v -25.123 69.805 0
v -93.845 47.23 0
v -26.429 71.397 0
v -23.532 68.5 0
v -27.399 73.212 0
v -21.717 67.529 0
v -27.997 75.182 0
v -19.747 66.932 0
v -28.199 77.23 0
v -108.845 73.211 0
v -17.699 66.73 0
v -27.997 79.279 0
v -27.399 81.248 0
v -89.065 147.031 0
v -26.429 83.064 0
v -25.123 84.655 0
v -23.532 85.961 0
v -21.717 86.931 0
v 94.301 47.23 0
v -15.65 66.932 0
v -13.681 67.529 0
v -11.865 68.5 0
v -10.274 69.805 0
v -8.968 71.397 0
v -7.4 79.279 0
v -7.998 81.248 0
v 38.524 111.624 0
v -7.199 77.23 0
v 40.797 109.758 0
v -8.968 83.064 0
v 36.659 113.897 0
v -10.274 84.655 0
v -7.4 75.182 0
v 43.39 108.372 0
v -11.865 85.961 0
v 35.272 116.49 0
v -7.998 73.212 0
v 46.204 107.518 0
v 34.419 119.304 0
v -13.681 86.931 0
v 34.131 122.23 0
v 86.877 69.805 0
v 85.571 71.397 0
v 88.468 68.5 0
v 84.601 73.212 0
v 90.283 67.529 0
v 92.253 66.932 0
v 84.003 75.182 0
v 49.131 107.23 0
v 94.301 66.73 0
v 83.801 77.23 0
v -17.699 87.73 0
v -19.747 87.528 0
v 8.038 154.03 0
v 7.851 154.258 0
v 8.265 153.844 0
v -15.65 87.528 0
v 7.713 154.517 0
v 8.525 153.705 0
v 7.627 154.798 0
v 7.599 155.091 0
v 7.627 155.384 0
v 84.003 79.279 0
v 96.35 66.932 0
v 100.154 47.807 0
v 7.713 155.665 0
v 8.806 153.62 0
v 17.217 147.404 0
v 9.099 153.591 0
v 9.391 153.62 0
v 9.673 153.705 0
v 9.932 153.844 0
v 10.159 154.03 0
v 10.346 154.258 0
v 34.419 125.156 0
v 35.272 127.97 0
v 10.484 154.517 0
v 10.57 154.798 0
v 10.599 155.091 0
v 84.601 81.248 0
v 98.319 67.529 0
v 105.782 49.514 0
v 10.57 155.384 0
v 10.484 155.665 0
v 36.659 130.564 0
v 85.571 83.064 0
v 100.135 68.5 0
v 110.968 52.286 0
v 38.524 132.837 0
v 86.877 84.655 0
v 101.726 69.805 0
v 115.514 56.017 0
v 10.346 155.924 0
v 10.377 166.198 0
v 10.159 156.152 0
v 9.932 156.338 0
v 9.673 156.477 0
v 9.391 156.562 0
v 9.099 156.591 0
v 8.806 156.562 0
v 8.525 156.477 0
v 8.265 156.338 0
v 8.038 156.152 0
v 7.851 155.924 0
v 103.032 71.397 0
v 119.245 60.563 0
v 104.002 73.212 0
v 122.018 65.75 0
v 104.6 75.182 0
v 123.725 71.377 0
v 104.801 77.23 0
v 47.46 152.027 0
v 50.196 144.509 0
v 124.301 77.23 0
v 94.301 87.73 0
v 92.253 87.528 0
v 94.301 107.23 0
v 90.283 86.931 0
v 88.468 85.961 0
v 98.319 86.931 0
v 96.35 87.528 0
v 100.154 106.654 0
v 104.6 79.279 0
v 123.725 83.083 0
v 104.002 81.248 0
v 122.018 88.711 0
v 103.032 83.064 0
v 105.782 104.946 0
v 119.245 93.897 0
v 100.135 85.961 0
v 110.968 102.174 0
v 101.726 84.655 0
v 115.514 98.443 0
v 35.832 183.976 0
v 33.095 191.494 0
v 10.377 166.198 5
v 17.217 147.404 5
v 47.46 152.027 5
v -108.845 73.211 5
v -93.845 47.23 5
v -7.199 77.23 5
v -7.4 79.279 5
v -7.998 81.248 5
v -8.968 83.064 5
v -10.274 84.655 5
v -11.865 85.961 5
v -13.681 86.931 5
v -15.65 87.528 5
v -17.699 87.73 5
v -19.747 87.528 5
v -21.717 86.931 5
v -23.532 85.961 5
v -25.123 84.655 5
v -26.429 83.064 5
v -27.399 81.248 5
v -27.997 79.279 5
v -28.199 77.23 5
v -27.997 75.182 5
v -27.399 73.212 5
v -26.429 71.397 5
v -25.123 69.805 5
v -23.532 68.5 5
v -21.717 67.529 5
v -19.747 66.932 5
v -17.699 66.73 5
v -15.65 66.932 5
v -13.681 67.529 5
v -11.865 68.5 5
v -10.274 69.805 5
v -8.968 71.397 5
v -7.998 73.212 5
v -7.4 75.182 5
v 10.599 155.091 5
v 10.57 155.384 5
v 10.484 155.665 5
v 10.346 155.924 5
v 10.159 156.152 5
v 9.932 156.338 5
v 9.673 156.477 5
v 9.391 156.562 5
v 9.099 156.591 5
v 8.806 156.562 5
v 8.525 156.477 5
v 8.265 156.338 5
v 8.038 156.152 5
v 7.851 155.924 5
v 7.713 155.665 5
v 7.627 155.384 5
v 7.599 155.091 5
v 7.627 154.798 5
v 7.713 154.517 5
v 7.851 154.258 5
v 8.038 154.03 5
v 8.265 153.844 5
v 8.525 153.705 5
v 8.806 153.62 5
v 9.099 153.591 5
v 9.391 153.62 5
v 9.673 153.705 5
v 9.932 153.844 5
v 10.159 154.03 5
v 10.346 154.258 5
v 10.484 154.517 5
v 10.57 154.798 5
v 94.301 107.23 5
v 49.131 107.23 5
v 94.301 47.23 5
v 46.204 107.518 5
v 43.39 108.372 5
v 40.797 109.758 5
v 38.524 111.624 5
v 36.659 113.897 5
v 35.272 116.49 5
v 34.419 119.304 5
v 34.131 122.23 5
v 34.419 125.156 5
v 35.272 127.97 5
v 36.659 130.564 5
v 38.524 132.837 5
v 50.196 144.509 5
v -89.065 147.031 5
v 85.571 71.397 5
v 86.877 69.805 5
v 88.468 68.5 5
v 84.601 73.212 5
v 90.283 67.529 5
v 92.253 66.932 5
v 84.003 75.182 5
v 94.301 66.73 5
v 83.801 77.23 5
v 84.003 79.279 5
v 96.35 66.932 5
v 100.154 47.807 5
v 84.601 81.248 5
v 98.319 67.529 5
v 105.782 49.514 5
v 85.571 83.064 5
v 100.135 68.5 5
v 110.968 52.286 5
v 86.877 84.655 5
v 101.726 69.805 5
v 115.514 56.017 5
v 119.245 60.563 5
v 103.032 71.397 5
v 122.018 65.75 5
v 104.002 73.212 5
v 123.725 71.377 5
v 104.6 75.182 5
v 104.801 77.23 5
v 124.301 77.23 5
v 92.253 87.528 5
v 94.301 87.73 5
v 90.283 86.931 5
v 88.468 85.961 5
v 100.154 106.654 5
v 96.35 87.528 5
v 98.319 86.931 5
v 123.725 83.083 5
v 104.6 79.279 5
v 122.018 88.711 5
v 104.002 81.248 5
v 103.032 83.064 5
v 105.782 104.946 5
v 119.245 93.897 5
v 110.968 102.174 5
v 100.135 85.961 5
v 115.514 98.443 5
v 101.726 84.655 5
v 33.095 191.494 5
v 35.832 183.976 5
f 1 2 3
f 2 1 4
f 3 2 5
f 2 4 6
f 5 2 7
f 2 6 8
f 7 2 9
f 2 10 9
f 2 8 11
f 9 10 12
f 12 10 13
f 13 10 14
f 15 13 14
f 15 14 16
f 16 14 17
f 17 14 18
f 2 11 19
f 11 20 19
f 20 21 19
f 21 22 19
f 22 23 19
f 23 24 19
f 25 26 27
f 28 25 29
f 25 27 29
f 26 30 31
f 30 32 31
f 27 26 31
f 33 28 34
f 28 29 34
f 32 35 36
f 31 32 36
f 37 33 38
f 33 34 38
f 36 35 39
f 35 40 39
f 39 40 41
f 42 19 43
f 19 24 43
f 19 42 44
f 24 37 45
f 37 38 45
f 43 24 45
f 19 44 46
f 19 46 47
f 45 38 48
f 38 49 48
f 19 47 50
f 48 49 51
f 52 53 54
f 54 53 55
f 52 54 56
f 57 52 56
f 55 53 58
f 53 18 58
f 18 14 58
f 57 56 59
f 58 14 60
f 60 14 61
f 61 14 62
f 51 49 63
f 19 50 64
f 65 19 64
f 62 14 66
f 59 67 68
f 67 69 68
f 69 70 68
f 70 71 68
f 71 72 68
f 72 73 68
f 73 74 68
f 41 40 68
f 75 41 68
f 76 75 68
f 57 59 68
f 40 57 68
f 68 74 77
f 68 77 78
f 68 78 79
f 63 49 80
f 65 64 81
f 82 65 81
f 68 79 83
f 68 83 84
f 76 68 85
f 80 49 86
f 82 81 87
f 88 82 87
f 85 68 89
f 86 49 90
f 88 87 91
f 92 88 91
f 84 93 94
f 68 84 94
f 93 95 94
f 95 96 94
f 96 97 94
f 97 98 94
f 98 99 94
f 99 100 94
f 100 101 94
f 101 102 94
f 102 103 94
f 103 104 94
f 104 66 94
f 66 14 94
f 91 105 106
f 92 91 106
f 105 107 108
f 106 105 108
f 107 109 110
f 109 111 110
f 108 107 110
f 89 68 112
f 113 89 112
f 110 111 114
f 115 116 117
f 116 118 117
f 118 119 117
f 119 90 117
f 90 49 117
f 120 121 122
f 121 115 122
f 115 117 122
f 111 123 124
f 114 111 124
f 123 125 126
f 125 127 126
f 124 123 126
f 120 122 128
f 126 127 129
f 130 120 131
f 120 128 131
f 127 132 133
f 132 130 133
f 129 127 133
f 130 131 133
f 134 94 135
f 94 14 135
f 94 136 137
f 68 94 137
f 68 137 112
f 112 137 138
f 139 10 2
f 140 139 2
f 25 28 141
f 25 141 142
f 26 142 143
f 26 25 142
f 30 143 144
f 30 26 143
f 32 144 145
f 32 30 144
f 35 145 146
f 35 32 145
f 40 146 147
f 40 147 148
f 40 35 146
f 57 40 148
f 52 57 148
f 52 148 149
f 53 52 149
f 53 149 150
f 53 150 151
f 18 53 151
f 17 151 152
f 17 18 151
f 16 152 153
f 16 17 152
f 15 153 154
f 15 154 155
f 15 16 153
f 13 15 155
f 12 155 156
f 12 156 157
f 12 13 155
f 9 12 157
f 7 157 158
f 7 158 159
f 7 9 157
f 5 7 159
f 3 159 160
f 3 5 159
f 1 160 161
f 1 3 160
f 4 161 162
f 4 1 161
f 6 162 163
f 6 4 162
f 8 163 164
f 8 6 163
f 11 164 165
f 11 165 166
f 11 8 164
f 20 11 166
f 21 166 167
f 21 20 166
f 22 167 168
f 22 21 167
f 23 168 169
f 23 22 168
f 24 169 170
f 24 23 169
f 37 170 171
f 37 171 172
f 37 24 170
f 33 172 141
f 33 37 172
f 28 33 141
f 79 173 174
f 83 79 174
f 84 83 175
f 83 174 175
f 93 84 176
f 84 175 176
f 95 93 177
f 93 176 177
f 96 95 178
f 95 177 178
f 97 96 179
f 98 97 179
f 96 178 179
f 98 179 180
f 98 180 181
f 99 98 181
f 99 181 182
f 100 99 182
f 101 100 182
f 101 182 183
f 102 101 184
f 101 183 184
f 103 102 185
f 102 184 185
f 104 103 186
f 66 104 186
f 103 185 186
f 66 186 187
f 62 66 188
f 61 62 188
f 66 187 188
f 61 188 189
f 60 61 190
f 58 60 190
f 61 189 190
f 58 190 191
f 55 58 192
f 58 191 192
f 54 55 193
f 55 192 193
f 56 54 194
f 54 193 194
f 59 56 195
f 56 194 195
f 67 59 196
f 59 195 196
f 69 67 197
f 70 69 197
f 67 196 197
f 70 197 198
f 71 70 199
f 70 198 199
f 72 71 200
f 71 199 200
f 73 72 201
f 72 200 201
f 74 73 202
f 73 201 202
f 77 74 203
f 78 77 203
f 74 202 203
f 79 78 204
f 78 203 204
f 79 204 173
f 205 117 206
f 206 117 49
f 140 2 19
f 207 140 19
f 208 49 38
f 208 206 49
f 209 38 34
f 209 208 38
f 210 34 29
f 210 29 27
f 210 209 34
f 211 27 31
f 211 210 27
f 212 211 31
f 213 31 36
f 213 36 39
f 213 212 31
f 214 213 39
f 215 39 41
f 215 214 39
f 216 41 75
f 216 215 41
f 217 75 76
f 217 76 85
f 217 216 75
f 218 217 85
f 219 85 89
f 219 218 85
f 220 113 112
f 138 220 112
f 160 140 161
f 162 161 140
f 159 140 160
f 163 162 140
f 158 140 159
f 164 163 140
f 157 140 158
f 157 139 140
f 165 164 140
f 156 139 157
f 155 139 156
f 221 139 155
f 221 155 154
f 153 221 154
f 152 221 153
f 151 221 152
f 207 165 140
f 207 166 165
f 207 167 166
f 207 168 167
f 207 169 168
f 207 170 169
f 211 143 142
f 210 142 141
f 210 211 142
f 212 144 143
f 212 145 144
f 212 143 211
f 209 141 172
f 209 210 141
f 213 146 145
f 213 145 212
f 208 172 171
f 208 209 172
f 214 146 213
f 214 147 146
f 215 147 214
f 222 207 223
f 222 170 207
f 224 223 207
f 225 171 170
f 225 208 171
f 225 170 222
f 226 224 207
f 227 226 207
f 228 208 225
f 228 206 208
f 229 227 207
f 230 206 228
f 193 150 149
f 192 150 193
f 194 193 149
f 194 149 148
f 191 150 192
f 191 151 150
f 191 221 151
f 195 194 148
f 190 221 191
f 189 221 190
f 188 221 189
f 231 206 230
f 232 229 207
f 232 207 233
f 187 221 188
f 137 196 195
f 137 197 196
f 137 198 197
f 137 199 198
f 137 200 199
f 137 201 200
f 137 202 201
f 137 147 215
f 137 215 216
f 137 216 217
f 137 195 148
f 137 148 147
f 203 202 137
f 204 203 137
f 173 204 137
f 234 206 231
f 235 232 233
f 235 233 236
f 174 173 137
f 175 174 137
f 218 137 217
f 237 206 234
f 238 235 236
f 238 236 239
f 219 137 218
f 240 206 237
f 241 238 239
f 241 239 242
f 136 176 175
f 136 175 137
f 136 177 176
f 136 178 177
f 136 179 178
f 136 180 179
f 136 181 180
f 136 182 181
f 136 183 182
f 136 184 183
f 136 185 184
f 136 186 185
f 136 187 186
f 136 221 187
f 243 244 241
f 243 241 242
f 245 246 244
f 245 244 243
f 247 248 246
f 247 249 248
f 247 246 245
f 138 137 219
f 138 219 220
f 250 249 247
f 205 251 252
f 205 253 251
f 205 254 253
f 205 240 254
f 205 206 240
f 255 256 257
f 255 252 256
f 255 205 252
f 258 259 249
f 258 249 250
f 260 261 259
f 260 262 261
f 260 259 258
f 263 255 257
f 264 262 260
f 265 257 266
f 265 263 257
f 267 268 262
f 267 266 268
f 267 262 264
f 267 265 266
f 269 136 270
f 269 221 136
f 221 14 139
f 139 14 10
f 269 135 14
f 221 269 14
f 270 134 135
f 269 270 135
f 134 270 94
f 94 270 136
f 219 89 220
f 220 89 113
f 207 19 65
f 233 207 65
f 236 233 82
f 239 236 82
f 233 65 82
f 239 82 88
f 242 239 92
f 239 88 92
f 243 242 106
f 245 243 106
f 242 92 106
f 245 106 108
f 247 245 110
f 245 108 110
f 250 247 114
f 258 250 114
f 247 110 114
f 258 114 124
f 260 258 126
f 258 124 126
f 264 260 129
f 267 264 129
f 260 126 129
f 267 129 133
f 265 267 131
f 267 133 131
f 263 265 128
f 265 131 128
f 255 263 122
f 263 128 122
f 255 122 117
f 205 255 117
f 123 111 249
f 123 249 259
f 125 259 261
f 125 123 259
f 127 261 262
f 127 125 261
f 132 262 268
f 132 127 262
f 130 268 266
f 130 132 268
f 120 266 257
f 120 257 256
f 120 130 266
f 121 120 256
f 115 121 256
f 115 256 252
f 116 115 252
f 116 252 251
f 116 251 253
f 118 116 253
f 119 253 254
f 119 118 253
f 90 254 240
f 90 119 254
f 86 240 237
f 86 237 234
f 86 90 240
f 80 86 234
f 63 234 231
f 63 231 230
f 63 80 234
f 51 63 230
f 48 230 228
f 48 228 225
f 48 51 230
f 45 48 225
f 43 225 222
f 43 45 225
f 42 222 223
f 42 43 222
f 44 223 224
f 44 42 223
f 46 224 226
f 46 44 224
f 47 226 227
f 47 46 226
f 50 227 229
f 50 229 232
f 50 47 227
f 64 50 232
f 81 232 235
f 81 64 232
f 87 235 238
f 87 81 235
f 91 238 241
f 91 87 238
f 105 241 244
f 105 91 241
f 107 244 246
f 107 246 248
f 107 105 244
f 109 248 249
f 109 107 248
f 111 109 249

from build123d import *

# Parameters (mm, degrees)
SKETCH1_R           = 10.5
BOSS_EXTRUDE1_DEPTH = 5
FILLET1_R           = 15
SKETCH2_R           = 1.5
CUT_EXTRUDE1_DEPTH  = 5


with BuildPart() as part:
    # Sketch1 → Boss-Extrude1 (new body)
    with BuildSketch(Plane.XY):
        with BuildLine():
            Line((94.301272012, 107.23010703), (12.917479745, 107.23010703))
            Line((12.917479745, 107.23010703), (50.196394157, 144.509021441))
            Line((50.196394157, 144.509021441), (33.09538699, 191.493652481))
            Line((33.09538699, 191.493652481), (-89.064653712, 147.031033848))
            Line((-89.064653712, 147.031033848), (-108.84470723, 73.210869143))
            Line((-108.84470723, 73.210869143), (-93.84470723, 47.23010703))
            Line((-93.84470723, 47.23010703), (94.301272012, 47.23010703))
            ThreePointArc((94.301272012, 47.23010703), (124.301272012, 77.23010703), (94.301272012, 107.23010703))
        make_face()
        with Locations((-17.698727988, 77.23010703)):
            Circle(SKETCH1_R, mode=Mode.SUBTRACT)
        with Locations((94.301272012, 77.23010703)):
            Circle(SKETCH1_R, mode=Mode.SUBTRACT)
    extrude(amount=BOSS_EXTRUDE1_DEPTH)

    # Fillet1
    fillet1_edges = [part.edges().sort_by_distance(p)[0] for p in [
        (12.917479745, 107.23010703, 2.5),
    ]]
    fillet(fillet1_edges, radius=FILLET1_R)

    # Sketch2 → Cut-Extrude1 (cut)
    with BuildSketch(Plane.XY.offset(5)):
        with Locations((9.098668989, 155.090939324)):
            Circle(SKETCH2_R)
        Polygon((35.831548137, 183.976111514), (10.37693066, 166.197966248), (17.217333526, 147.404113833), (47.46023301, 152.026562408), align=None)
    extrude(amount=-CUT_EXTRUDE1_DEPTH, mode=Mode.SUBTRACT)


solid = part.part
